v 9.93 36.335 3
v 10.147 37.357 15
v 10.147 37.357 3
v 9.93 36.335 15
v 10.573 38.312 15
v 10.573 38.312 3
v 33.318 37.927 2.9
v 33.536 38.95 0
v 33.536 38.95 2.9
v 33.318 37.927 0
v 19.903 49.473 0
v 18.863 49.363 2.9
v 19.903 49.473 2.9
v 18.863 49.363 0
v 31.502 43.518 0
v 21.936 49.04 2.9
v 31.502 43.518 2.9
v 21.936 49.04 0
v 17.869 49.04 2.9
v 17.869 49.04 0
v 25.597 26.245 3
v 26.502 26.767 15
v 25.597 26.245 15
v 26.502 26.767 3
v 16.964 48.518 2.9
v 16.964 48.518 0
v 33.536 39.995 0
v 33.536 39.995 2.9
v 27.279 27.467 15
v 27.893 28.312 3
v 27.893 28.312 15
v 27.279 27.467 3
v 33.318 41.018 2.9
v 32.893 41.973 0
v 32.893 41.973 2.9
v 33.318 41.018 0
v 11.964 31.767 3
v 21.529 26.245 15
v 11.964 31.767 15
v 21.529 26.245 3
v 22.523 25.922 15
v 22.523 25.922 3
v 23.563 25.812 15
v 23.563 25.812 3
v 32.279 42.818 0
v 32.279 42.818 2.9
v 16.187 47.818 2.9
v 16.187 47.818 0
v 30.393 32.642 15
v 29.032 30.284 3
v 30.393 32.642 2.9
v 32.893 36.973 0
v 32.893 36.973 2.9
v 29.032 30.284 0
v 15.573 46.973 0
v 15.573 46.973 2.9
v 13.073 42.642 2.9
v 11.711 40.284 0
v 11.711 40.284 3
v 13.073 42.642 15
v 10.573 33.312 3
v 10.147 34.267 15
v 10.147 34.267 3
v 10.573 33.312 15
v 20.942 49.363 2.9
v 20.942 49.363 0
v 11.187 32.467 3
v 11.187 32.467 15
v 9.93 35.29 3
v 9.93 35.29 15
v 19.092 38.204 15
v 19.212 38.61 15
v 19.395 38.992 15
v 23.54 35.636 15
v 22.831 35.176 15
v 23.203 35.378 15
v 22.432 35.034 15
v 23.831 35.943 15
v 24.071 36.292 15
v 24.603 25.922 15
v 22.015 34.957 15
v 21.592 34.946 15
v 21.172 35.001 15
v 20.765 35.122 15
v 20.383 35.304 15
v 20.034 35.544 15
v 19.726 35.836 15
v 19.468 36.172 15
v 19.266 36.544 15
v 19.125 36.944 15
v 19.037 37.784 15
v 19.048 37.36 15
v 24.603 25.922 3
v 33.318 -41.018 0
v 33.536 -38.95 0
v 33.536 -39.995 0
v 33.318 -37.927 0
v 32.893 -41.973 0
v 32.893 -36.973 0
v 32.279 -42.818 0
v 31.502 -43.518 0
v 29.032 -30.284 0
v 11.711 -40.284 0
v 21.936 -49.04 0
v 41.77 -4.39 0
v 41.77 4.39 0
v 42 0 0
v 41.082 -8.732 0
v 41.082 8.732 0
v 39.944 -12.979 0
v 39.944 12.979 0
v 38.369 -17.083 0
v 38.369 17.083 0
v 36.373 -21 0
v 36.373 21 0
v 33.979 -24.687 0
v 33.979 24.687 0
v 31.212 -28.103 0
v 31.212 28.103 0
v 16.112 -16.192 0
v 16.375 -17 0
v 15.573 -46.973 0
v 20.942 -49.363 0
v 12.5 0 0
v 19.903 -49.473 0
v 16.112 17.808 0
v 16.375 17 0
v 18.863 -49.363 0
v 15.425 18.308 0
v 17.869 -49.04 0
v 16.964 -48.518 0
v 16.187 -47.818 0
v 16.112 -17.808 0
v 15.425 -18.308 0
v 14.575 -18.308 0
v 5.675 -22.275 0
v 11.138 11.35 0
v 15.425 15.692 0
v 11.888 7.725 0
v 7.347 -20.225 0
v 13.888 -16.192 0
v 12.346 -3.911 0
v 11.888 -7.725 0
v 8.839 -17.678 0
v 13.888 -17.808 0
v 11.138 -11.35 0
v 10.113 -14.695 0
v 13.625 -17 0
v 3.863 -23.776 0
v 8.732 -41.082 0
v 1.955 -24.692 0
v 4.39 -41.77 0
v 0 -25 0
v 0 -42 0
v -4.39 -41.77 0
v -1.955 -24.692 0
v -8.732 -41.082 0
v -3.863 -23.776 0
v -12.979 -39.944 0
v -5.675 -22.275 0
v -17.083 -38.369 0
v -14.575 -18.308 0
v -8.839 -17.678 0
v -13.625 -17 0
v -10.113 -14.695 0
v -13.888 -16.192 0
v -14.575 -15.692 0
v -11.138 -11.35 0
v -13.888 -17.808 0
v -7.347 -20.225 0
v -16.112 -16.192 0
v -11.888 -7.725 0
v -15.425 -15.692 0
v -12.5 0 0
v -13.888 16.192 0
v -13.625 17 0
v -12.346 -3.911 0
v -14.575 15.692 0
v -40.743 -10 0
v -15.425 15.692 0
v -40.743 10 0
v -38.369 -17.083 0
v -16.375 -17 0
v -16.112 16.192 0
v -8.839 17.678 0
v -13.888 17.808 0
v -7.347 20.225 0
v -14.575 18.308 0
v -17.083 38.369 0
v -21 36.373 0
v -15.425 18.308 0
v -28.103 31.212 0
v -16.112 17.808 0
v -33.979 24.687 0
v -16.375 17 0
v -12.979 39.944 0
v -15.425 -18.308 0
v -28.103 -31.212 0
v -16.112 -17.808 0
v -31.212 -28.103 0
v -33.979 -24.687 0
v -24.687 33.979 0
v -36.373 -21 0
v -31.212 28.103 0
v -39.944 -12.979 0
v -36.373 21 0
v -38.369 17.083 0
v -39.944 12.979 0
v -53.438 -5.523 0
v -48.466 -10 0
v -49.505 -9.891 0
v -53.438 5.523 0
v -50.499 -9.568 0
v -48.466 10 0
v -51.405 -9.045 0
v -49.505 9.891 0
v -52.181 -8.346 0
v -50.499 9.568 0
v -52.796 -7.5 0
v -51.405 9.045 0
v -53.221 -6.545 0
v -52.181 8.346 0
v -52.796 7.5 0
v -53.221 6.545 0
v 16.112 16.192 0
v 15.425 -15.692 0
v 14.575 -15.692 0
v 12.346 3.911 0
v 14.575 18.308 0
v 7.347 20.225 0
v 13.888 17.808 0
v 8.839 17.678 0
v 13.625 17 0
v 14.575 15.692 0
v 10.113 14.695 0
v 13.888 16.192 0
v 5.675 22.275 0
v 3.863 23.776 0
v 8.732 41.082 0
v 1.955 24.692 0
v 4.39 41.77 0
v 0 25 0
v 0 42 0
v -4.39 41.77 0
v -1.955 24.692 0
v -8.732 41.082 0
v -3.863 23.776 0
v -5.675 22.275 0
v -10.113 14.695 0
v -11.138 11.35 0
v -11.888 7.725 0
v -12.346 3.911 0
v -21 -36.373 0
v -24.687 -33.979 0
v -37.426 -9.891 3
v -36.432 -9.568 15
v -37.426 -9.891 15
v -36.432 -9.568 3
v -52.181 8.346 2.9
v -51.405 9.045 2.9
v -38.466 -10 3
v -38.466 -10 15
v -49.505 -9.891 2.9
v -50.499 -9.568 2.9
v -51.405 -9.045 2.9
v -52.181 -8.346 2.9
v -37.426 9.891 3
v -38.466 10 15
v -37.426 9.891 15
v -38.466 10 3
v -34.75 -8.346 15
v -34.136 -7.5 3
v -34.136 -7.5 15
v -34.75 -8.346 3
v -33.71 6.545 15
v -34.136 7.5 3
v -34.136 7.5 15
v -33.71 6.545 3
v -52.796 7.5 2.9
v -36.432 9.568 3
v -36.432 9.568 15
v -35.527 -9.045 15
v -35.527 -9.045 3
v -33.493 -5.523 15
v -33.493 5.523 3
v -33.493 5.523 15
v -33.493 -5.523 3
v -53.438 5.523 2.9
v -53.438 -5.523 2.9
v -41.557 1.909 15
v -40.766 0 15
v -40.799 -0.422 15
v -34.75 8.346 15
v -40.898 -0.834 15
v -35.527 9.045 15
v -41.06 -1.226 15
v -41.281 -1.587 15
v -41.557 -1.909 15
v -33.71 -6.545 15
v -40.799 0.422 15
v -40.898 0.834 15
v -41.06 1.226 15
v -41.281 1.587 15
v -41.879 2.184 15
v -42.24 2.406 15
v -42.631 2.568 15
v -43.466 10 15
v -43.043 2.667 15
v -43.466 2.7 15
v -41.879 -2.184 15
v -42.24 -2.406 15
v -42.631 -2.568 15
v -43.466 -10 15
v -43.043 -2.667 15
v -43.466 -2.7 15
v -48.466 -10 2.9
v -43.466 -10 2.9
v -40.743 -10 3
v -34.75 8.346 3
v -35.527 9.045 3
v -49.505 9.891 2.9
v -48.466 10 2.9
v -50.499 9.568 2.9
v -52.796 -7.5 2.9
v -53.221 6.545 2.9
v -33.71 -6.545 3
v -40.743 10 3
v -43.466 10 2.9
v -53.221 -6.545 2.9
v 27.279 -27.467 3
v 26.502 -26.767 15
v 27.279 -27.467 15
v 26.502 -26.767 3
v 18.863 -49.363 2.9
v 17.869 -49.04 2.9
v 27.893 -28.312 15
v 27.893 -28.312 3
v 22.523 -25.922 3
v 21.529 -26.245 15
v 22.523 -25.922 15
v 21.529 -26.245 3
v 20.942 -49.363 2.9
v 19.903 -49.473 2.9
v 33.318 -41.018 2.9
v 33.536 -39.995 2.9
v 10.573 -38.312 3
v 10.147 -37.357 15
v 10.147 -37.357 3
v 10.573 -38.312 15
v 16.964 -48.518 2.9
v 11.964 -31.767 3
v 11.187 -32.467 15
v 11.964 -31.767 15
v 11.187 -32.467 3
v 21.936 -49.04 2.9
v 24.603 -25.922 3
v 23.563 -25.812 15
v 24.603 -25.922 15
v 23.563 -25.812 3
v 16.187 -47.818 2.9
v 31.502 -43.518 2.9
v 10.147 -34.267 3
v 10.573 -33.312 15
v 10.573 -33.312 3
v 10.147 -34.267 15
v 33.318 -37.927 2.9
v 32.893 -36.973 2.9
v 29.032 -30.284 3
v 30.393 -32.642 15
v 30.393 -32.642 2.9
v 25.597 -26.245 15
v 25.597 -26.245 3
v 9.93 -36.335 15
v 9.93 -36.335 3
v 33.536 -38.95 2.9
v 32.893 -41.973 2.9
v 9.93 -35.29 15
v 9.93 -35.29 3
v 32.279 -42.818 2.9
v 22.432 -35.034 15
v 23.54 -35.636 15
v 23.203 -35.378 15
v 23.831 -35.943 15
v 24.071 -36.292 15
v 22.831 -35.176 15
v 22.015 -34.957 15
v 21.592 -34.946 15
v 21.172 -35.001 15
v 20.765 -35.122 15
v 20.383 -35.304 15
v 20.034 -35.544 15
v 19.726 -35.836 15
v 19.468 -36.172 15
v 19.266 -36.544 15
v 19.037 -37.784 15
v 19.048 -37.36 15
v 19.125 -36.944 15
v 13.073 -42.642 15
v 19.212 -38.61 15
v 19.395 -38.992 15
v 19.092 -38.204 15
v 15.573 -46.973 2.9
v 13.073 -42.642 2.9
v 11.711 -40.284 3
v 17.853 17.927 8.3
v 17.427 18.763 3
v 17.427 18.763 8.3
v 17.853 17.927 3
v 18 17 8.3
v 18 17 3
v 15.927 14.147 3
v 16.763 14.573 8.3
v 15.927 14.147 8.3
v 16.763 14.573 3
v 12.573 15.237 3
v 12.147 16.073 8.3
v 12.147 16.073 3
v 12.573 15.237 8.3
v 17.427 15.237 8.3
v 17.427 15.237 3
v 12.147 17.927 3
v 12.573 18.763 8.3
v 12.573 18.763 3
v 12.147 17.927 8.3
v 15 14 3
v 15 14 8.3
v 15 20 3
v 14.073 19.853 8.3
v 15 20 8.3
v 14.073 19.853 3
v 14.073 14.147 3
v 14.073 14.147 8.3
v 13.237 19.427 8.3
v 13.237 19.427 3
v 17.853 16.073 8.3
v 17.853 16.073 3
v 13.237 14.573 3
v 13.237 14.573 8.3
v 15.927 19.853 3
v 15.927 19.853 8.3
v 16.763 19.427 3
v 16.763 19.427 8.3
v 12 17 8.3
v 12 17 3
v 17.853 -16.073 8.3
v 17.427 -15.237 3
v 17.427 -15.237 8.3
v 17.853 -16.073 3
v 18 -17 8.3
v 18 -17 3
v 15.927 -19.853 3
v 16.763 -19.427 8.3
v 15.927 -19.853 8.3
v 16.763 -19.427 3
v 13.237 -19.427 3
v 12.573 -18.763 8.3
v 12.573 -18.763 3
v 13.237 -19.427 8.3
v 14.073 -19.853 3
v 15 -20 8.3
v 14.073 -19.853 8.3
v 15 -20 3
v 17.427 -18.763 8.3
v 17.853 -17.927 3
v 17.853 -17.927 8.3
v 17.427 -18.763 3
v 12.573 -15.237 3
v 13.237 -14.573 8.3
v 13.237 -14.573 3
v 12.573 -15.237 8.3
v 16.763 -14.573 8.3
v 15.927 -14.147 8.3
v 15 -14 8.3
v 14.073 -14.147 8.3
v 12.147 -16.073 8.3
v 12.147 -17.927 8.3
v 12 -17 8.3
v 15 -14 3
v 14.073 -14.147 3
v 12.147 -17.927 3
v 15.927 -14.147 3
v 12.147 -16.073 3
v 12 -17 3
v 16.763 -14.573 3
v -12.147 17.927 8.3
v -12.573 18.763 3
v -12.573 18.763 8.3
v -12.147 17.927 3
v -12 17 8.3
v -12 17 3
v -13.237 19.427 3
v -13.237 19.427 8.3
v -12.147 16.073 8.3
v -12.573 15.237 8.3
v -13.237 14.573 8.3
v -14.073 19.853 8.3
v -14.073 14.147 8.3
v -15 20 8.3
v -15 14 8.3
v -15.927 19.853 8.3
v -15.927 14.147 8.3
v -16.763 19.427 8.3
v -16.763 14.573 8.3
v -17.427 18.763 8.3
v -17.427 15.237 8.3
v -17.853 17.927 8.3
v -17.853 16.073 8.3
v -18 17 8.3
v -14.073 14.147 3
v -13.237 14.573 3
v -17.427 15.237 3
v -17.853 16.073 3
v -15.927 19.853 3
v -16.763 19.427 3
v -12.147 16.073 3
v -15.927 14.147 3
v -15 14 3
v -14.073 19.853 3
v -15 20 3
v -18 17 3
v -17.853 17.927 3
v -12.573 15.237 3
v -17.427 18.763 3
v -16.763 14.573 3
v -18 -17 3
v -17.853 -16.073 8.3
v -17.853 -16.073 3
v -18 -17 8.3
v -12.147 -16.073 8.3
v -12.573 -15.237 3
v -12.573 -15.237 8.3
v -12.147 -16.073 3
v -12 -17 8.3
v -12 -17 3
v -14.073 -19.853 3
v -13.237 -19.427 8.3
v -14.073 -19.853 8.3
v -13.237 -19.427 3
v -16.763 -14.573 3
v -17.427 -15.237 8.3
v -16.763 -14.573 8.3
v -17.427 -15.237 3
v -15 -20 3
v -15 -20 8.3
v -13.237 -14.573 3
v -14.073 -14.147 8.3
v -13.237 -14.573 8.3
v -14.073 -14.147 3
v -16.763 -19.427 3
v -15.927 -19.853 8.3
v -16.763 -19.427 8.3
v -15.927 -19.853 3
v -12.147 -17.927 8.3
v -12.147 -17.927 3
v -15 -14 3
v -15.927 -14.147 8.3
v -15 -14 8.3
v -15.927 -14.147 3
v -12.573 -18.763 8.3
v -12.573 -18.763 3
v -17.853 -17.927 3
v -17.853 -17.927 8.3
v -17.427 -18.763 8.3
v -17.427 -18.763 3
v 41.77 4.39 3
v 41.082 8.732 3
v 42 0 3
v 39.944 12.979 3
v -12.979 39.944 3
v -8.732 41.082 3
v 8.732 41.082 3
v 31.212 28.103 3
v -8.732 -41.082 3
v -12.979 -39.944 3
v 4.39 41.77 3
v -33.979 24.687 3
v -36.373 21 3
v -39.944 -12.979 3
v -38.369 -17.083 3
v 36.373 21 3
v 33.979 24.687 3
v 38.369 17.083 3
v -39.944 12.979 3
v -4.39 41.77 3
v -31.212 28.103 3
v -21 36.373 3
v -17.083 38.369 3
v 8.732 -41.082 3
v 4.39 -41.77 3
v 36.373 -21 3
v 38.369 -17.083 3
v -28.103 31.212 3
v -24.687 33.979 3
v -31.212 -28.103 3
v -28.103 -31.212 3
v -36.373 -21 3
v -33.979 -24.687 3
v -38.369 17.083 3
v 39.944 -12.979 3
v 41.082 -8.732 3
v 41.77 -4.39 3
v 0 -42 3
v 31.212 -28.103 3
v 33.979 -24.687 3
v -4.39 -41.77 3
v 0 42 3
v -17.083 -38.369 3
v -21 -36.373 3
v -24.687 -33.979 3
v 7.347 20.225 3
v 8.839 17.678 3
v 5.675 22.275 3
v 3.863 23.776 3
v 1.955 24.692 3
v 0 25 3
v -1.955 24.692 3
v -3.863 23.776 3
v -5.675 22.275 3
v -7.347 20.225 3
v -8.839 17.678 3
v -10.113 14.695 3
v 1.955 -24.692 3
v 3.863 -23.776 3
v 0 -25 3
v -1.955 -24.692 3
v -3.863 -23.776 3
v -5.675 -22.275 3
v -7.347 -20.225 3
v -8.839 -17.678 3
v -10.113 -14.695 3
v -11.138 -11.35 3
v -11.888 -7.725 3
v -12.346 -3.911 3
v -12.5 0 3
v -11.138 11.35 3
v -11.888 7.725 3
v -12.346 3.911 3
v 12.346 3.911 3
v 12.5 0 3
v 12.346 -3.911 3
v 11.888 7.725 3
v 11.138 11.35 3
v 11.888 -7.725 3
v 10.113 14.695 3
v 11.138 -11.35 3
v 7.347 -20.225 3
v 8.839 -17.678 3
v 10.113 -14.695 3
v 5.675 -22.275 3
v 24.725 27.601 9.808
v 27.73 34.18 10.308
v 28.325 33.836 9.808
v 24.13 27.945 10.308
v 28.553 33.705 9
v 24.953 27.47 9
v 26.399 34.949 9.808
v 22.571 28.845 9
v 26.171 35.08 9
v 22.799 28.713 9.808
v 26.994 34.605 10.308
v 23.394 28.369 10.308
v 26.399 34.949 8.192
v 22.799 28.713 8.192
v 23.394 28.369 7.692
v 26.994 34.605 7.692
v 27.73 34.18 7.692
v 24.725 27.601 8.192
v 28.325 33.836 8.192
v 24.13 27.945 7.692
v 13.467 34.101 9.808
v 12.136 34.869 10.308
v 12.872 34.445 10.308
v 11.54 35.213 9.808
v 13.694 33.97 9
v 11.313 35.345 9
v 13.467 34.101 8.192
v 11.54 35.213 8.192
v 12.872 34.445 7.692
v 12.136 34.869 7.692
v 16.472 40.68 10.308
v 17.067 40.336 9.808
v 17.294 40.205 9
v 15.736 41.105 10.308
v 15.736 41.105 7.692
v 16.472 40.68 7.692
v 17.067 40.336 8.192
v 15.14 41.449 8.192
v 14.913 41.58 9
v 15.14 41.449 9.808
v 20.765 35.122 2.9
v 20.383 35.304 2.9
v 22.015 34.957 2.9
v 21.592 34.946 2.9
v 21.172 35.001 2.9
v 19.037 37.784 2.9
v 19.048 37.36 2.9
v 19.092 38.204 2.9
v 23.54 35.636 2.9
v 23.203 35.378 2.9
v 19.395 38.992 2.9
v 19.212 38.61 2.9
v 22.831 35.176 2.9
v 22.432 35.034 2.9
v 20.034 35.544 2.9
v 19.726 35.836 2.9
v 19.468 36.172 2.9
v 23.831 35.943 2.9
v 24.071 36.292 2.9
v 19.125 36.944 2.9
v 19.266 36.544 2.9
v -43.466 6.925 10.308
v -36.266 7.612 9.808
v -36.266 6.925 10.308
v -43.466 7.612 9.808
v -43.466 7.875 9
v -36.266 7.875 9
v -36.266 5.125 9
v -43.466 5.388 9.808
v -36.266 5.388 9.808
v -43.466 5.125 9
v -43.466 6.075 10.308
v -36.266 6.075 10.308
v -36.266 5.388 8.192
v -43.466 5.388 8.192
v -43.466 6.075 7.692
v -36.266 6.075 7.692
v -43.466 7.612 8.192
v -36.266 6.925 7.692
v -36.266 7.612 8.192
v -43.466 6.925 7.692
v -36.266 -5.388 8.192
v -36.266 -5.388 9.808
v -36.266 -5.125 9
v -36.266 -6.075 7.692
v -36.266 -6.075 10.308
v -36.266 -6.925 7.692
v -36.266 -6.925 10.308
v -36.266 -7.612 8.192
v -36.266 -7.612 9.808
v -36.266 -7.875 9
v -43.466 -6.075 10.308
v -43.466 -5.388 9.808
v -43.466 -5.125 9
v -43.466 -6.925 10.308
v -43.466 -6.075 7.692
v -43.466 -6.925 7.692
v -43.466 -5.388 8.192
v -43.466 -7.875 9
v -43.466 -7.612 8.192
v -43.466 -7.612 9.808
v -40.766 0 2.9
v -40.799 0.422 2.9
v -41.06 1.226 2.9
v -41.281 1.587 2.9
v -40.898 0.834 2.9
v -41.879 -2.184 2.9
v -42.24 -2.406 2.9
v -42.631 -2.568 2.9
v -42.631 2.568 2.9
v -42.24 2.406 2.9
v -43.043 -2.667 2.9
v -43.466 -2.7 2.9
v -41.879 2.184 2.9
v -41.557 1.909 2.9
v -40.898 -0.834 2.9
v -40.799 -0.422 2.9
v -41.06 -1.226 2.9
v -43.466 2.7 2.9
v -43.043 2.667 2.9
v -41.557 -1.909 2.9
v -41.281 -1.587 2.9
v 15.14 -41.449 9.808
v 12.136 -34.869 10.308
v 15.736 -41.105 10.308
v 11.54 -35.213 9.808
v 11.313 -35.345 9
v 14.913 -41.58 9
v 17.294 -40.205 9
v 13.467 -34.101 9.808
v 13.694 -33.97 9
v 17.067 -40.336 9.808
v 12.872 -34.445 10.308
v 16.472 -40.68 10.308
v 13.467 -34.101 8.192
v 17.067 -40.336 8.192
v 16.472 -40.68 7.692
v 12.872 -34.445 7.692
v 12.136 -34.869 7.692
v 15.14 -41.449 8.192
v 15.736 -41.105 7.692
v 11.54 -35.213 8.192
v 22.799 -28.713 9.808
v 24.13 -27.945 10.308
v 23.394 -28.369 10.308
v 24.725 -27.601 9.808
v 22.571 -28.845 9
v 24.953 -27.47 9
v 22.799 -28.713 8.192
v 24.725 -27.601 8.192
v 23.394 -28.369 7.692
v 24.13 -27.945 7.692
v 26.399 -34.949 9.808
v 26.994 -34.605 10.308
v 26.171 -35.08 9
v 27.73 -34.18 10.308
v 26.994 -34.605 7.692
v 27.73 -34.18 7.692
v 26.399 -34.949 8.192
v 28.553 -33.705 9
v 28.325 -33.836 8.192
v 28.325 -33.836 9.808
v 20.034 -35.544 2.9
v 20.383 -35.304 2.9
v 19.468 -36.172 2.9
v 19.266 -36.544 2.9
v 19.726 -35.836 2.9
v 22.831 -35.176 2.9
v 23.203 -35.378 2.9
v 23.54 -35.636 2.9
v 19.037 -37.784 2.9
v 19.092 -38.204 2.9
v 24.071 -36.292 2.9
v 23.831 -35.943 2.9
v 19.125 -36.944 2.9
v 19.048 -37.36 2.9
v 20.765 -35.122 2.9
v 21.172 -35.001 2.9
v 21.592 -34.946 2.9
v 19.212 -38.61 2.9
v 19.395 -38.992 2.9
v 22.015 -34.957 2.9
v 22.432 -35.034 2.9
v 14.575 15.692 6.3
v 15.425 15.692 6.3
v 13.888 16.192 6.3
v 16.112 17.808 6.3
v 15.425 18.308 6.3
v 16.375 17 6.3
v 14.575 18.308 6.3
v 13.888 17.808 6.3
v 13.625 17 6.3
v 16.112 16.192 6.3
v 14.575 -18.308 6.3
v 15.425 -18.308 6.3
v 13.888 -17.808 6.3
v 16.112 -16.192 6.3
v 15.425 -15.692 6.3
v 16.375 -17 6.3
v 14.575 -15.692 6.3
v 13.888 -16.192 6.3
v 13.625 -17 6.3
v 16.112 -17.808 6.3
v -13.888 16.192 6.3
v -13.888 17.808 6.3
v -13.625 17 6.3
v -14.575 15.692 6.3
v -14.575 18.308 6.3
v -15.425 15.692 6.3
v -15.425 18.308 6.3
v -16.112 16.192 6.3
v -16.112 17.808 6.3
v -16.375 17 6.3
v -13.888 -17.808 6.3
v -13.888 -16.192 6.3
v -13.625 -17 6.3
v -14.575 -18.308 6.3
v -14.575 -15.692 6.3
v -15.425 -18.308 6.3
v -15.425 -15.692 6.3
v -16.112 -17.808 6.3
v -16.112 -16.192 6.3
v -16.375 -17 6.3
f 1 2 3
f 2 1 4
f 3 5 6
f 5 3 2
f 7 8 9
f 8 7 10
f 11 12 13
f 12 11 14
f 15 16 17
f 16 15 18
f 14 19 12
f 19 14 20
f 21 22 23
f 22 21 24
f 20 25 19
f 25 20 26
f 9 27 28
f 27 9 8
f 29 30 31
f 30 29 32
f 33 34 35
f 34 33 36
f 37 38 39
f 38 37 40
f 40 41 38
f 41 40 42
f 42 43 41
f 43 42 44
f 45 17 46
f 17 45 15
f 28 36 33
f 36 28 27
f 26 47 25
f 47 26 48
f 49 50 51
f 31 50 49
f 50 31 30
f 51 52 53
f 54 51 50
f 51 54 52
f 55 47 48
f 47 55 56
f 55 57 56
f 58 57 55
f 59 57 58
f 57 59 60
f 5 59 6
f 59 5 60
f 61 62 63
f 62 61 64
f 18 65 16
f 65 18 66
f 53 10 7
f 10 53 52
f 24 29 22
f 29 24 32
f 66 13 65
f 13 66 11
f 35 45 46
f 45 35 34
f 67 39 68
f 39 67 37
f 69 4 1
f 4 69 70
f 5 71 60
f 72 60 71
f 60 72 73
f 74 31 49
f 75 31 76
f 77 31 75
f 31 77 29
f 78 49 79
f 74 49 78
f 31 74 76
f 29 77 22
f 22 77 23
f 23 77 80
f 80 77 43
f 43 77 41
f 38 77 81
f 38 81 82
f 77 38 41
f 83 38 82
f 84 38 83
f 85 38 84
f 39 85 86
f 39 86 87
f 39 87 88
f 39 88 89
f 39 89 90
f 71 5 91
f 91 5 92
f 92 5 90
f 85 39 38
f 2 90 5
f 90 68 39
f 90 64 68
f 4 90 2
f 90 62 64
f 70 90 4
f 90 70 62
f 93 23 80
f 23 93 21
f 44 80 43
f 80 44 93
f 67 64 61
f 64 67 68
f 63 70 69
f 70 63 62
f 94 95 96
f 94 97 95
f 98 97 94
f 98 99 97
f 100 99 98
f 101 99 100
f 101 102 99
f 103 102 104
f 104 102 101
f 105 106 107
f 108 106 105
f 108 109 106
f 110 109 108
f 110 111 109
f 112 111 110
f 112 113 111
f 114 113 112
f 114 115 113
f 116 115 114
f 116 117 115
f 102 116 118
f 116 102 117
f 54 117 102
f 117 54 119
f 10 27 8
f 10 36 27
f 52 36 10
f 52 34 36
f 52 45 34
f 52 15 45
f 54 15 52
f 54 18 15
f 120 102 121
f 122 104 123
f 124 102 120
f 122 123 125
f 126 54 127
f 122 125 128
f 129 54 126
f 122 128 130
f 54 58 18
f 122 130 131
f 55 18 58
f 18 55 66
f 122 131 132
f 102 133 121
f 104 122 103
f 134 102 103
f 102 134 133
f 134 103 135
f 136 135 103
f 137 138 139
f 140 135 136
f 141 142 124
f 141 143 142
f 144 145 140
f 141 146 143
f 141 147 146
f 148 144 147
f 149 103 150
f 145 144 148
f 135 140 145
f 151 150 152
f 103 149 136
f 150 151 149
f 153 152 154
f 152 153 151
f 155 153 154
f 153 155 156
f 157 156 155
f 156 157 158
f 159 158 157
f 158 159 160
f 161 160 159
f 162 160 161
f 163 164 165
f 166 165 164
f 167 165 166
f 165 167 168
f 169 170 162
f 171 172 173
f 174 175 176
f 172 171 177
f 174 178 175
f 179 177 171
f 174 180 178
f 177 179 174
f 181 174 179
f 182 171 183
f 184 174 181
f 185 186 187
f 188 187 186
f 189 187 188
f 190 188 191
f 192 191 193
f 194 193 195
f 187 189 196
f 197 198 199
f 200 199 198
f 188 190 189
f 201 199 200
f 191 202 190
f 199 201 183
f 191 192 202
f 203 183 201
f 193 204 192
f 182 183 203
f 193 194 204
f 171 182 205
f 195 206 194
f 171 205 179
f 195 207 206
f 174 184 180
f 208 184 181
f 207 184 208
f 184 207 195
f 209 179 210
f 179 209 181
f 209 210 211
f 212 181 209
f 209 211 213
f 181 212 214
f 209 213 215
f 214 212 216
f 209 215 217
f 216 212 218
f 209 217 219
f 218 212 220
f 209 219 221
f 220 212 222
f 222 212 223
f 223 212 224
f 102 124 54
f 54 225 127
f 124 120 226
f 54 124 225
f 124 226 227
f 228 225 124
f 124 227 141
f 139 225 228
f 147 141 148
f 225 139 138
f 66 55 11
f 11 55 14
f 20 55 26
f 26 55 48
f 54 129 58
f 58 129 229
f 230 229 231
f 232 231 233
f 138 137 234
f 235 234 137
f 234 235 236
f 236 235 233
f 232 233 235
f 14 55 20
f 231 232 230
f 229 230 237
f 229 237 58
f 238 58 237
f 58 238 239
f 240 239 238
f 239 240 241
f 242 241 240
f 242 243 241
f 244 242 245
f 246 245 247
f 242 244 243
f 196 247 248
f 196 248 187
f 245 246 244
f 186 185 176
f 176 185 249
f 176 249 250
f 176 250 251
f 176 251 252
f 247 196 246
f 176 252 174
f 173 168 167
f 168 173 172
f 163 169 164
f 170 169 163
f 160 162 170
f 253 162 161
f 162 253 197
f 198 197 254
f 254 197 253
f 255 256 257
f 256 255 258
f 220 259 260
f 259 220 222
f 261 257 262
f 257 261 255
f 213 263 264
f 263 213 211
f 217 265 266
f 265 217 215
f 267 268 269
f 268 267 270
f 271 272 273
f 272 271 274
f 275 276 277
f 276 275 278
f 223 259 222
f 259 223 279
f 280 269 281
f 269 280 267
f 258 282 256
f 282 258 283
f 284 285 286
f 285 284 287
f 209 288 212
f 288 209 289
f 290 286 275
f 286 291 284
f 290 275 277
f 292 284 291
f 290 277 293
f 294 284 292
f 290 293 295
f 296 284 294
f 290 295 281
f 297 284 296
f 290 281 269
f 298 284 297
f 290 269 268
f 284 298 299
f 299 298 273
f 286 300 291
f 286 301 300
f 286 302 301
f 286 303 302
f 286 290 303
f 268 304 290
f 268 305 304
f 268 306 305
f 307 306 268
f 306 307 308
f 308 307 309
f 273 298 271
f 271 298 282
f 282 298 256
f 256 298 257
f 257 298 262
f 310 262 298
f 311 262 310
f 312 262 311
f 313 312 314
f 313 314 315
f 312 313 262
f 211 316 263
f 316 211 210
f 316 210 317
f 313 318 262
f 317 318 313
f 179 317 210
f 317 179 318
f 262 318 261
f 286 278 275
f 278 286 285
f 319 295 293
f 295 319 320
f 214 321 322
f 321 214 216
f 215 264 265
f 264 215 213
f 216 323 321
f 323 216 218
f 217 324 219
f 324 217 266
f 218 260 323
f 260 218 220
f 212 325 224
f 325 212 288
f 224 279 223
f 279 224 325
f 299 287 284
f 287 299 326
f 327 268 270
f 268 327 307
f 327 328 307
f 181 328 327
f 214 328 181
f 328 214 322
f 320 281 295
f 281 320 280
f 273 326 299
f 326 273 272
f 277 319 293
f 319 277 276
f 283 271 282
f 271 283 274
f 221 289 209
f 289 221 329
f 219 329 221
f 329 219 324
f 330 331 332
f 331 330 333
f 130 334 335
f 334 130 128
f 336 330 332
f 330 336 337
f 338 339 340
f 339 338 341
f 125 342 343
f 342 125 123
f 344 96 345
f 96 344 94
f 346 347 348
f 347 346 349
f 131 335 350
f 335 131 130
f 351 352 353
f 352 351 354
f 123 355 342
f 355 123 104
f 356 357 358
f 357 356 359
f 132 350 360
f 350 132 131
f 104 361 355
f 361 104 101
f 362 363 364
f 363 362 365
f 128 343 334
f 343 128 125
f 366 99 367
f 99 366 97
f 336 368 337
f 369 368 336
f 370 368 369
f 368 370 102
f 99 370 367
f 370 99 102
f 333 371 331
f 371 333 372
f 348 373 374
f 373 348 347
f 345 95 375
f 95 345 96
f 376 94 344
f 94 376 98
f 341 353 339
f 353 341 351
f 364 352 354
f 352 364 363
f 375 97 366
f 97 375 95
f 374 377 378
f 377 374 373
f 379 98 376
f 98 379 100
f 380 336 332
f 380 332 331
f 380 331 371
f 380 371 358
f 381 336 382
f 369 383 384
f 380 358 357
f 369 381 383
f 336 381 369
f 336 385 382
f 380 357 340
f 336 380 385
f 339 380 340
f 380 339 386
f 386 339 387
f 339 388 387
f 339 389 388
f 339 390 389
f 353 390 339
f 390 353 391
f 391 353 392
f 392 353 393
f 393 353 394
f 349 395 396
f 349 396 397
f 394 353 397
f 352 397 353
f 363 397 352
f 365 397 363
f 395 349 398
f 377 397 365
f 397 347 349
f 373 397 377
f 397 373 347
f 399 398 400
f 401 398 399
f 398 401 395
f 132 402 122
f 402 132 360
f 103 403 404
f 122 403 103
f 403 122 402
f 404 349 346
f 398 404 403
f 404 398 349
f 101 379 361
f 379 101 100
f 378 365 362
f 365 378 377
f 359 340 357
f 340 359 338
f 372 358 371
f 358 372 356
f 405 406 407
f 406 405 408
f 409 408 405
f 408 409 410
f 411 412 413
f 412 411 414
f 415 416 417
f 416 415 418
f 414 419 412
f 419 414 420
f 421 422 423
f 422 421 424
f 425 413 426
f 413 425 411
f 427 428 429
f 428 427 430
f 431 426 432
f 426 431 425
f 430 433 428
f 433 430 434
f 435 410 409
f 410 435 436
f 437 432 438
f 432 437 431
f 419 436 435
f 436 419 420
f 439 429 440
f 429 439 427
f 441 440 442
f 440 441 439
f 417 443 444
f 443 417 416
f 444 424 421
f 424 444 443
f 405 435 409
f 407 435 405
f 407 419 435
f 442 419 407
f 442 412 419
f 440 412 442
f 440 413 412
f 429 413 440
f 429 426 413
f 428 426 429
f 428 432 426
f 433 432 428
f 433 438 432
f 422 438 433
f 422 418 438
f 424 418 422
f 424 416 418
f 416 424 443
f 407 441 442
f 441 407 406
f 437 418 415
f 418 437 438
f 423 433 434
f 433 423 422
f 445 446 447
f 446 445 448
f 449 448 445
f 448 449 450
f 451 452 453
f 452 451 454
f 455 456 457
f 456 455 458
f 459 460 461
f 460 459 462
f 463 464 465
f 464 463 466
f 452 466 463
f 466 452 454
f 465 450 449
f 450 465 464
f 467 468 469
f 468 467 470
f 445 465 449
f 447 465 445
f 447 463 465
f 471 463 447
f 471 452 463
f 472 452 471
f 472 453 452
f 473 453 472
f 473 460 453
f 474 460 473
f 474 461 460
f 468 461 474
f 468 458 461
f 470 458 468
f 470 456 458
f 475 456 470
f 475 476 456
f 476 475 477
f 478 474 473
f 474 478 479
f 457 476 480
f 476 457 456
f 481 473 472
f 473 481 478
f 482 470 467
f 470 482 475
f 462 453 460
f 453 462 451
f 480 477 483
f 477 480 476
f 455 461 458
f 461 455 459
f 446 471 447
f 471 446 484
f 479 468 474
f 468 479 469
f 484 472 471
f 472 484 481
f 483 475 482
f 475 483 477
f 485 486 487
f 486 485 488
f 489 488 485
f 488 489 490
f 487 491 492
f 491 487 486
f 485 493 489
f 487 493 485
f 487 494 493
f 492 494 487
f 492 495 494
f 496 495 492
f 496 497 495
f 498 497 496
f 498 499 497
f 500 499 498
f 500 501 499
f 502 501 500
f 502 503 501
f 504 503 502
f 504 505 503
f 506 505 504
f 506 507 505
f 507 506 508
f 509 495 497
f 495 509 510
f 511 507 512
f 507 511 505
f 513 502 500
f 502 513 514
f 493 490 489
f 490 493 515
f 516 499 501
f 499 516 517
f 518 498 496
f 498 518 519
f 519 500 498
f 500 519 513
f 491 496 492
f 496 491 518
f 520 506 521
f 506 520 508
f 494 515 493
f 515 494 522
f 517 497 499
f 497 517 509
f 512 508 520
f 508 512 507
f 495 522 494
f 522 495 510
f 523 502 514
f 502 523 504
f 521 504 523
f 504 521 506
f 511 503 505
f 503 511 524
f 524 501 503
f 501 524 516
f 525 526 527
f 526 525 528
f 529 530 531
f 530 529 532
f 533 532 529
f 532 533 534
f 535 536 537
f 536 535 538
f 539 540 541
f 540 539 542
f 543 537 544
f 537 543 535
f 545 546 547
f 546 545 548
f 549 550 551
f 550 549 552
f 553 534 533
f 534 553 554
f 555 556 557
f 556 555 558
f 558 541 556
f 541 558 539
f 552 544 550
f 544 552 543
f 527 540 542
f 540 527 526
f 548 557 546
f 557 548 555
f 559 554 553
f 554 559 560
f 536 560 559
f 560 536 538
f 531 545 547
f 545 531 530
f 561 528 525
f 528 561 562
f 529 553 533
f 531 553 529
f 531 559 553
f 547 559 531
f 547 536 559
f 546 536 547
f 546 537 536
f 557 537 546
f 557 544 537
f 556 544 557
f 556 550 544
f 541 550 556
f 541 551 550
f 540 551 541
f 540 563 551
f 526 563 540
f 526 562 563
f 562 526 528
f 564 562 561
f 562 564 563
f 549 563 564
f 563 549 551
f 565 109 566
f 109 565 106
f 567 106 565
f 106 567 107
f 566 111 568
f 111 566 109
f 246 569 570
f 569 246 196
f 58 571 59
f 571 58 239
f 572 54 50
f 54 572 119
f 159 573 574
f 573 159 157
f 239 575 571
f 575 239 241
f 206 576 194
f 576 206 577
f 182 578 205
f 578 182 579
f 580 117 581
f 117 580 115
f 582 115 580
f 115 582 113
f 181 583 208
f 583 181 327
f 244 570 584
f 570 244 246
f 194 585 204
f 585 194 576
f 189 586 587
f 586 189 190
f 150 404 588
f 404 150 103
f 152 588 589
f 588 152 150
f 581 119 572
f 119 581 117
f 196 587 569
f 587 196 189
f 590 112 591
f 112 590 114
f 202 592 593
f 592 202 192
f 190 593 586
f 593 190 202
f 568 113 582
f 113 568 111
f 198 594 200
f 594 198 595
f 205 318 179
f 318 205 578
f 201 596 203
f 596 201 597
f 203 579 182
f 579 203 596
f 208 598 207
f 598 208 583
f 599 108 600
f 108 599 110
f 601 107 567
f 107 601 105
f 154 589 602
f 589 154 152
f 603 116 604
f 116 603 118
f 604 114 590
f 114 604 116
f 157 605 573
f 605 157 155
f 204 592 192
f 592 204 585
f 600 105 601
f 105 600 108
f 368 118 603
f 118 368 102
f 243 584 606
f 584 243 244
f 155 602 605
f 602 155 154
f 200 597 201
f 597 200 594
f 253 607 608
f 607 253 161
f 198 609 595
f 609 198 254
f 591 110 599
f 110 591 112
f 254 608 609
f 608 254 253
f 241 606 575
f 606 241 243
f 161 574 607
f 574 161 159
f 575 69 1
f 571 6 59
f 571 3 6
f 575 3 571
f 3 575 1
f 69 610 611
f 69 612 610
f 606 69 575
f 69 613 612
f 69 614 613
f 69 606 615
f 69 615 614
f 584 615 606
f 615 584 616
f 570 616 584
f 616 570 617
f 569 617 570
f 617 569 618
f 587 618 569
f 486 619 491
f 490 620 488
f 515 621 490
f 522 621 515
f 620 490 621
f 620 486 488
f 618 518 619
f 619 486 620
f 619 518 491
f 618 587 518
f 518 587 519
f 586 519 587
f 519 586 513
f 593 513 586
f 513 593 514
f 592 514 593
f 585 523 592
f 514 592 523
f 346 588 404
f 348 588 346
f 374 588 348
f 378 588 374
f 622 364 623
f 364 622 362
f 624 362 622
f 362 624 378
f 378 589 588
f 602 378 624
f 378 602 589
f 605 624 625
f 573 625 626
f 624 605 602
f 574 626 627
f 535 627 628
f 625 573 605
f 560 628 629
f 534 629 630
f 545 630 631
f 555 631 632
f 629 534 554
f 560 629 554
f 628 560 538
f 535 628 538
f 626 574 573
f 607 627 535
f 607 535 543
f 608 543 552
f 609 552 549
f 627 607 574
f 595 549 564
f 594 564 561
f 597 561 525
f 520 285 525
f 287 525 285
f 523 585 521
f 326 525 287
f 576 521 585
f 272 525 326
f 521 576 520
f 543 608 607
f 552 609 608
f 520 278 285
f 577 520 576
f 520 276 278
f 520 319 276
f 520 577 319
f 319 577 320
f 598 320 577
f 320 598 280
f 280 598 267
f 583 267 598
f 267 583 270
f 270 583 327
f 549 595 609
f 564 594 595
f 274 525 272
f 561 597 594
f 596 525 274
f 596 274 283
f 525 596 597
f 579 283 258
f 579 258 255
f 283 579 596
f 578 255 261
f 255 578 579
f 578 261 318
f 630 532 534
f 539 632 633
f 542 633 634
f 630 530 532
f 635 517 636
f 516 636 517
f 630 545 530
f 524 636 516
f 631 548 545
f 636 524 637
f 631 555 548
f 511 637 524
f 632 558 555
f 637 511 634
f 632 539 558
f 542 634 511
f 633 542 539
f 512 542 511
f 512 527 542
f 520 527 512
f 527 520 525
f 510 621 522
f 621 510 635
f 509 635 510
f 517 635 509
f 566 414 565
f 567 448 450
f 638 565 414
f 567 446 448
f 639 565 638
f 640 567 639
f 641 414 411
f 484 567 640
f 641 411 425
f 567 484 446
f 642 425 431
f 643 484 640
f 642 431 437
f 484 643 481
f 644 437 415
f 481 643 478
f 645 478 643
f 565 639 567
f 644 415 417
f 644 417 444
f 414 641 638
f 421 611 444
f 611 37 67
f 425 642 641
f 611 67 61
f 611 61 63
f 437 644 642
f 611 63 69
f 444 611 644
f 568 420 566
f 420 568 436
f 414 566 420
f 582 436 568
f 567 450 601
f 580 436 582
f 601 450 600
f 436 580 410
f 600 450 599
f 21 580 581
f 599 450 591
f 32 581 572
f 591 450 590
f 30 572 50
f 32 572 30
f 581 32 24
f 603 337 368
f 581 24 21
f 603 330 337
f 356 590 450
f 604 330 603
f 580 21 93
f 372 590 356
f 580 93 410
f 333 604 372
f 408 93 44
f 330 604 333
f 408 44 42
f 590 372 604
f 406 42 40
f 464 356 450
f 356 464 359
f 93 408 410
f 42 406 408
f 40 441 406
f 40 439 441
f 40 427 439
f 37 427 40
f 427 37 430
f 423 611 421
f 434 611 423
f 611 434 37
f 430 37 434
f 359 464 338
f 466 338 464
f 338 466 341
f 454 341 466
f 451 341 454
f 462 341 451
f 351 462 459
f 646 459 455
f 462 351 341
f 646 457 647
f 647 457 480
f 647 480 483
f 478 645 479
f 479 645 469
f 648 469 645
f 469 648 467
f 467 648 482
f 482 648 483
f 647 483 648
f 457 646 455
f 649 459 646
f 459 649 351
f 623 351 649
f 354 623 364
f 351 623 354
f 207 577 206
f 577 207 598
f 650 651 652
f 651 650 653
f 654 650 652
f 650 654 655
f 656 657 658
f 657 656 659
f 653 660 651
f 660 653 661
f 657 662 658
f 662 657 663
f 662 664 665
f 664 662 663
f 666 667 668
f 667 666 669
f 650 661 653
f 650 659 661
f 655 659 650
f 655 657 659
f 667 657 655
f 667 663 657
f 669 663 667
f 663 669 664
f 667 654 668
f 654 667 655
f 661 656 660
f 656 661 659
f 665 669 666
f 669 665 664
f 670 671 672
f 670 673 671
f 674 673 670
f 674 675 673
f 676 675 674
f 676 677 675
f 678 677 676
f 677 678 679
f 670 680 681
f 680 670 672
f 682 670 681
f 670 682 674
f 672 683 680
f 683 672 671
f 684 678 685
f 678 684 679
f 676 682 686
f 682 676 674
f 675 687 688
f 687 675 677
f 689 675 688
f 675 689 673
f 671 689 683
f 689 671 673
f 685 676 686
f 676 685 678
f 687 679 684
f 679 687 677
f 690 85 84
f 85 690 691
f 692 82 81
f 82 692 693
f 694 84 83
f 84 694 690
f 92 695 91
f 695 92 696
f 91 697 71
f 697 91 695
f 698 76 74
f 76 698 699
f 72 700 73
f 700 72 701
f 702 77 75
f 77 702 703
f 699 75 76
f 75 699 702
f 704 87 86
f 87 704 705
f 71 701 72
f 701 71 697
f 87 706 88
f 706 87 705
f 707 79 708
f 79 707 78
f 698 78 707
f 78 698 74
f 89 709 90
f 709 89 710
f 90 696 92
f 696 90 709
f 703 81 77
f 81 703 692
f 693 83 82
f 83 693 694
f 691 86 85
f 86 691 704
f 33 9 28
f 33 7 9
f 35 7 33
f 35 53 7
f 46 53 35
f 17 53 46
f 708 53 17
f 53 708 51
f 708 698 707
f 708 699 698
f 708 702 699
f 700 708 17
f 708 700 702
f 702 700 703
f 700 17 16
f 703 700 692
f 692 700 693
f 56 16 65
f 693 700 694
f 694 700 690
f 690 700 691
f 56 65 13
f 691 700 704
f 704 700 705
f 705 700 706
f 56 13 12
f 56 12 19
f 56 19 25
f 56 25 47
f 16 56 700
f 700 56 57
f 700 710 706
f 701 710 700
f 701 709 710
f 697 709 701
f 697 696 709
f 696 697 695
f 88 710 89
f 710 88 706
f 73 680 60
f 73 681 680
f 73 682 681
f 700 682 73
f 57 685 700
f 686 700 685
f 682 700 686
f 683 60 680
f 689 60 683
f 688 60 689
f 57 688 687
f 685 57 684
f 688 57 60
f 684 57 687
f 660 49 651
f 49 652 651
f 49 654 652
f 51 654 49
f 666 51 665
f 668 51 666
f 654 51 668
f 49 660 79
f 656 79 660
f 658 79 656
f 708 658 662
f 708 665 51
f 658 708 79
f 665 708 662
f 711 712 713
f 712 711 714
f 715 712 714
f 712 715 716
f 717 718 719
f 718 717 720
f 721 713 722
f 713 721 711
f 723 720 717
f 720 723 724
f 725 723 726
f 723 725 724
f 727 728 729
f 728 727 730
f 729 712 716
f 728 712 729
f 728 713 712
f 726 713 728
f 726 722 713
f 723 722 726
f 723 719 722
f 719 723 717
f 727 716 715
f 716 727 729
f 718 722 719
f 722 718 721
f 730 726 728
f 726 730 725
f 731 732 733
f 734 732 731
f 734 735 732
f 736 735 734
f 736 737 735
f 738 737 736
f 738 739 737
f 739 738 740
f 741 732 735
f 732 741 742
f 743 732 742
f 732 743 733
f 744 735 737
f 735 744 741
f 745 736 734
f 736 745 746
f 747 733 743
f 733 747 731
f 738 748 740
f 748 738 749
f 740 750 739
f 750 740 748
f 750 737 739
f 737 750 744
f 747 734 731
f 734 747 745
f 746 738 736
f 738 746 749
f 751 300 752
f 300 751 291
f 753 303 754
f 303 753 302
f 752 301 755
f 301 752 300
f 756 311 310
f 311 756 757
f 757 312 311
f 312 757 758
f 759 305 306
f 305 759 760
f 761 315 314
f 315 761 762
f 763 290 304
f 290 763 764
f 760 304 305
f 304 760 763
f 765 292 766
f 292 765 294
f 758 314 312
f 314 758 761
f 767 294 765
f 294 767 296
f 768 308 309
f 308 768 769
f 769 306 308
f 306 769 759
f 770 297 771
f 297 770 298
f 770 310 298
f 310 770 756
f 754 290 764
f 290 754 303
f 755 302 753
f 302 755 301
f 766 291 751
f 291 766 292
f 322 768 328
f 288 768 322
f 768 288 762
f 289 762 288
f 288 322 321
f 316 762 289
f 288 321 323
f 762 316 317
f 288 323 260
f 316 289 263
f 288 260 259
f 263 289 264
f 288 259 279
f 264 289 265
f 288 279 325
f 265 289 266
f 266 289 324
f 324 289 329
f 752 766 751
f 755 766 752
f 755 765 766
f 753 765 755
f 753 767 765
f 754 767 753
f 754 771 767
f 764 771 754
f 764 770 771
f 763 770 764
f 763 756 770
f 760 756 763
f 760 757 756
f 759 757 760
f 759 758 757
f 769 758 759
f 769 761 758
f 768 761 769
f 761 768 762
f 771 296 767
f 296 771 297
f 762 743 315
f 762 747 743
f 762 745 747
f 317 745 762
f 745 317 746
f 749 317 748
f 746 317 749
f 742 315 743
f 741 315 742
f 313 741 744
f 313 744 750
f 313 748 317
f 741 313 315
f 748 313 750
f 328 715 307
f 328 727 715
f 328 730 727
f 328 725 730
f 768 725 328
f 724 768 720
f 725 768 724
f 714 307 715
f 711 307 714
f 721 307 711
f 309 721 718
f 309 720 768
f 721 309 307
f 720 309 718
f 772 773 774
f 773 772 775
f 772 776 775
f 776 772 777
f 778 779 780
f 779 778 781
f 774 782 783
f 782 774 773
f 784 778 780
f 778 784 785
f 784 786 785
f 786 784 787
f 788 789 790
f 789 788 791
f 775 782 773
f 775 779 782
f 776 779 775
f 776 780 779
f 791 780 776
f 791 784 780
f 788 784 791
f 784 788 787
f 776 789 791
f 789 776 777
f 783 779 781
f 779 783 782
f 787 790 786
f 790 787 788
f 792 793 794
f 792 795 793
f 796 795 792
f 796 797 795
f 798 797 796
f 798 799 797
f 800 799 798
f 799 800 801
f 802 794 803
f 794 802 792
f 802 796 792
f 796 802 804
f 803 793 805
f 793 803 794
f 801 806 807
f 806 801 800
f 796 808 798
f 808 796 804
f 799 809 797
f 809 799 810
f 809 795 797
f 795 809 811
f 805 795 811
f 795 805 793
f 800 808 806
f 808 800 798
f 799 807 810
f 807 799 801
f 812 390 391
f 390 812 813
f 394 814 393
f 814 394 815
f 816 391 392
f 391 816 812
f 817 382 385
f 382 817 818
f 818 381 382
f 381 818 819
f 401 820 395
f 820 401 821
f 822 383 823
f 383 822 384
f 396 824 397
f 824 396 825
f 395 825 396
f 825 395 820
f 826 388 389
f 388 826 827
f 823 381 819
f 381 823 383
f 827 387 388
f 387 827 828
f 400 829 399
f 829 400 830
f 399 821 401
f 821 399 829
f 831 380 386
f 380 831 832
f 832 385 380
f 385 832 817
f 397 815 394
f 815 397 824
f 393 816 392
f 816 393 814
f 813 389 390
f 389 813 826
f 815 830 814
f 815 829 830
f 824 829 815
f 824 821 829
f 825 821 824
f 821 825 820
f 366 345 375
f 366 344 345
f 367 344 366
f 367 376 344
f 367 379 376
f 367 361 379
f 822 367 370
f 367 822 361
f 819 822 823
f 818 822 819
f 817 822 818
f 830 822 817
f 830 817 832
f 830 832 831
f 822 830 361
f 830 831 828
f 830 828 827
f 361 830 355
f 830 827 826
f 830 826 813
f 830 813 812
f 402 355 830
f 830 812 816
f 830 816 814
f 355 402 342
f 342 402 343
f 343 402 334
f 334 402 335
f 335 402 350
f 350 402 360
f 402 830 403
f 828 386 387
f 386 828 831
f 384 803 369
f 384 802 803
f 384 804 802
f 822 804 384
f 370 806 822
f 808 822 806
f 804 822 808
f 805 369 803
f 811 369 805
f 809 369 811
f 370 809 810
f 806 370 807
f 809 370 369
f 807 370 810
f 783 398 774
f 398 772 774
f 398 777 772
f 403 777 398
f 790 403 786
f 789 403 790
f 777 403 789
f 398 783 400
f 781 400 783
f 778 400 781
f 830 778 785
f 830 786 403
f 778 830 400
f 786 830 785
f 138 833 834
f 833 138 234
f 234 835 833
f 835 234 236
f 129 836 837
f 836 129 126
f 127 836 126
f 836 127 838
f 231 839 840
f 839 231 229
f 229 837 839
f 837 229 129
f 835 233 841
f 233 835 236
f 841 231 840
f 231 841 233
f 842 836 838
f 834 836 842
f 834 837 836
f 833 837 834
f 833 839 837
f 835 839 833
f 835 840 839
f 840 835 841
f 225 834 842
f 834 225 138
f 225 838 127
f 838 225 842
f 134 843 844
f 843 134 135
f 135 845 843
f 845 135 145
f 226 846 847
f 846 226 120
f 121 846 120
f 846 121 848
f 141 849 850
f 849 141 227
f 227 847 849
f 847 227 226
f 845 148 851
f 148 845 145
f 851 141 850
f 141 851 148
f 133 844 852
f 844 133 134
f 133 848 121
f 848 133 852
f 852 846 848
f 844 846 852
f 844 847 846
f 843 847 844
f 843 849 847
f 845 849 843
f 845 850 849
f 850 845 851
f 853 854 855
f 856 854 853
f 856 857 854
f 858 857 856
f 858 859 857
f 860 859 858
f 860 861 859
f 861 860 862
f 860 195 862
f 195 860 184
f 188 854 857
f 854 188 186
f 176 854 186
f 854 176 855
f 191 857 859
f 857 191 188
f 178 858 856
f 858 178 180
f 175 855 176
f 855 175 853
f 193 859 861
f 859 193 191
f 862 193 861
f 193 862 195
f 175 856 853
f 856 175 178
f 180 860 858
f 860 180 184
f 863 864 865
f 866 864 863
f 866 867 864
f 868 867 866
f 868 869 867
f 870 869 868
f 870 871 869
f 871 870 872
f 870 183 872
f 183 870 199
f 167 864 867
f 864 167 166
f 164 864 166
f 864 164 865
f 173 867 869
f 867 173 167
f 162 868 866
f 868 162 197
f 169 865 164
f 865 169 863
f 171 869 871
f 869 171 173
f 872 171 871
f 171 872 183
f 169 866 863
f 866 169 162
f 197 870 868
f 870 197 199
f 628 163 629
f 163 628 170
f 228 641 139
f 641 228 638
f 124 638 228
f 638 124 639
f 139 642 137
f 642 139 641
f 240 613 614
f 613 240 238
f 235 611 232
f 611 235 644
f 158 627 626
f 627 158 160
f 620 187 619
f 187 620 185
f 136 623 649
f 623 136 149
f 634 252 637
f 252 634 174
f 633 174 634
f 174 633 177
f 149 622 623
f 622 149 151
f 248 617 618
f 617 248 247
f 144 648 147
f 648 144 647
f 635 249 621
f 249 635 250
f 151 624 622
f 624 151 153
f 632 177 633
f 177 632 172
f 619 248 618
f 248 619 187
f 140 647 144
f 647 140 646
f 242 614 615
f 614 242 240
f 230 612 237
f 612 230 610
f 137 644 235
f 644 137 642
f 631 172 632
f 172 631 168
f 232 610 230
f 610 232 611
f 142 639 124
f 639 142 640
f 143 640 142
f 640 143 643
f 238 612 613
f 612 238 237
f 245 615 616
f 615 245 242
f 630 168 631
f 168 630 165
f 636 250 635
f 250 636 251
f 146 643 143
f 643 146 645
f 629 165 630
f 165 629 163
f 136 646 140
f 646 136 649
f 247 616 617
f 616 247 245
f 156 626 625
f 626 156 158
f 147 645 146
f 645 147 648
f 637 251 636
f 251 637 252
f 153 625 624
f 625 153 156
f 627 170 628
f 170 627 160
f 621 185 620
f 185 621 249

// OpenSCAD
// file: lib/stepper.scad
smWidth = 42;
smLength = 40;
smScrewHoleOffsets = 31/2;
smCenterDiameter = 22;
smExtra = 1;

module stepperMotor() {
    smCenterHeight = 2;
    smShaftDiameter = 5;
    smShaftLength = 23;
    smScrewDepth = 4.5;
    smScrewDiameter = 3;
    smEdgeTrimOffset = 27;
    module add() {
        translate([-smWidth/2, -smLength, -smWidth/2]) {
            cube([smWidth, smLength, smWidth]);
        }
        rotate([-90, 0, 0]) {
            cylinder(d=smCenterDiameter, h=smCenterHeight, $fn=30);
            cylinder(d=smShaftDiameter, h=smShaftLength, $fn=20);
        }
    }
    module del() {
        for (x = [smScrewHoleOffsets, -smScrewHoleOffsets]) {
            for (z = [smScrewHoleOffsets, -smScrewHoleOffsets]) {
                translate([x, iota, z]) {
                    rotate([90, 0, 0]) {
                        cylinder(d=smScrewDiameter, h=smScrewDepth, $fn=40);
                    }
                }
            }
        }
        for (a = [45, 135, 225, 315]) {
            rotate([0, a, 0]) {
                translate([smEdgeTrimOffset,
                        -smLength-iota, -smWidth/2-iota]) {
                    cube([smWidth, smLength+2*iota, smWidth+2*iota]);
                }
            }
        }

    }
    difference() {
        add();
        del();
    }
}

module stepperMotorHole() {
    smHoleHeight = 20;
    smScrewHoleDiameter = 4;

    widthPlusExtra = smWidth + smExtra;
    lengthPlusExtra = smLength + smExtra/2;

    translate([-smWidth/2, -lengthPlusExtra, -widthPlusExtra/2]) {
        cube([smWidth, lengthPlusExtra, widthPlusExtra]);
    }
    translate([0, -iota, 0]) {
        rotate([-90, 0, 0]) {
            cylinder(d=smCenterDiameter+smExtra, h=smHoleHeight, $fn=40);
        }
    }
    for (x = [smScrewHoleOffsets, -smScrewHoleOffsets]) {
        for (z = [smScrewHoleOffsets, -smScrewHoleOffsets]) {
            translate([x, smHoleHeight-iota, z]) {
                rotate([90, 0, 0]) {
                    cylinder(d=smScrewHoleDiameter, h=smHoleHeight, $fn=40);
                }
            }
        }
    }

}
// file: lib/commonConstants.scad
// A small quantity to keep parts from starting or ending at exactly the
// same location. For example when we create a hole through an object we
// want the object being subtracted to stick slightly past the object being
// subtracted from.
iota = 0.1;


// Length and hole diameter of the #4 x 3/8in Phillips mount screw.
screwLength = 9.3;
screwHoleDiameter = 2.75;
screwHeadDiameter = 6.5;
screwBodyDiameter = 3.4;


// These constants are the basic parameters of the mount plate. They are
// necessary for other components to make their calculations.
mountPlateWidth = 37.6;
mountPlateLength = 51;


// These constants are the basis for the carbon fiber mount points. They are
// necessary for other components to make their calculations.
mountRodDiameter = 5.5;         // A little extra because holes are smaller.
mountThickness = 9;
mountDiameter = mountRodDiameter + 2*mountThickness;


// These constasnts are teh basis for the motor base. They are necessary for
// other components to make their calculations.
motorBaseExtraAxisOffset = 5;
motorBaseTopOffset = sqrt(3)*mountPlateWidth/6 + motorBaseExtraAxisOffset;
motorBaseBottomOffset = mountPlateLength/sqrt(2) + motorBaseTopOffset;
motorBaseBottomRadius = sqrt(pow(motorBaseBottomOffset,2) +
                             pow(mountPlateWidth/2, 2));
mountBaseRodOffsets = motorBaseBottomRadius-mountDiameter/2;
// main file
include <lib/commonConstants.scad>;
include <lib/stepper.scad>;
include <lib/commonMounts.scad>;

twoWheelMotorMount();
